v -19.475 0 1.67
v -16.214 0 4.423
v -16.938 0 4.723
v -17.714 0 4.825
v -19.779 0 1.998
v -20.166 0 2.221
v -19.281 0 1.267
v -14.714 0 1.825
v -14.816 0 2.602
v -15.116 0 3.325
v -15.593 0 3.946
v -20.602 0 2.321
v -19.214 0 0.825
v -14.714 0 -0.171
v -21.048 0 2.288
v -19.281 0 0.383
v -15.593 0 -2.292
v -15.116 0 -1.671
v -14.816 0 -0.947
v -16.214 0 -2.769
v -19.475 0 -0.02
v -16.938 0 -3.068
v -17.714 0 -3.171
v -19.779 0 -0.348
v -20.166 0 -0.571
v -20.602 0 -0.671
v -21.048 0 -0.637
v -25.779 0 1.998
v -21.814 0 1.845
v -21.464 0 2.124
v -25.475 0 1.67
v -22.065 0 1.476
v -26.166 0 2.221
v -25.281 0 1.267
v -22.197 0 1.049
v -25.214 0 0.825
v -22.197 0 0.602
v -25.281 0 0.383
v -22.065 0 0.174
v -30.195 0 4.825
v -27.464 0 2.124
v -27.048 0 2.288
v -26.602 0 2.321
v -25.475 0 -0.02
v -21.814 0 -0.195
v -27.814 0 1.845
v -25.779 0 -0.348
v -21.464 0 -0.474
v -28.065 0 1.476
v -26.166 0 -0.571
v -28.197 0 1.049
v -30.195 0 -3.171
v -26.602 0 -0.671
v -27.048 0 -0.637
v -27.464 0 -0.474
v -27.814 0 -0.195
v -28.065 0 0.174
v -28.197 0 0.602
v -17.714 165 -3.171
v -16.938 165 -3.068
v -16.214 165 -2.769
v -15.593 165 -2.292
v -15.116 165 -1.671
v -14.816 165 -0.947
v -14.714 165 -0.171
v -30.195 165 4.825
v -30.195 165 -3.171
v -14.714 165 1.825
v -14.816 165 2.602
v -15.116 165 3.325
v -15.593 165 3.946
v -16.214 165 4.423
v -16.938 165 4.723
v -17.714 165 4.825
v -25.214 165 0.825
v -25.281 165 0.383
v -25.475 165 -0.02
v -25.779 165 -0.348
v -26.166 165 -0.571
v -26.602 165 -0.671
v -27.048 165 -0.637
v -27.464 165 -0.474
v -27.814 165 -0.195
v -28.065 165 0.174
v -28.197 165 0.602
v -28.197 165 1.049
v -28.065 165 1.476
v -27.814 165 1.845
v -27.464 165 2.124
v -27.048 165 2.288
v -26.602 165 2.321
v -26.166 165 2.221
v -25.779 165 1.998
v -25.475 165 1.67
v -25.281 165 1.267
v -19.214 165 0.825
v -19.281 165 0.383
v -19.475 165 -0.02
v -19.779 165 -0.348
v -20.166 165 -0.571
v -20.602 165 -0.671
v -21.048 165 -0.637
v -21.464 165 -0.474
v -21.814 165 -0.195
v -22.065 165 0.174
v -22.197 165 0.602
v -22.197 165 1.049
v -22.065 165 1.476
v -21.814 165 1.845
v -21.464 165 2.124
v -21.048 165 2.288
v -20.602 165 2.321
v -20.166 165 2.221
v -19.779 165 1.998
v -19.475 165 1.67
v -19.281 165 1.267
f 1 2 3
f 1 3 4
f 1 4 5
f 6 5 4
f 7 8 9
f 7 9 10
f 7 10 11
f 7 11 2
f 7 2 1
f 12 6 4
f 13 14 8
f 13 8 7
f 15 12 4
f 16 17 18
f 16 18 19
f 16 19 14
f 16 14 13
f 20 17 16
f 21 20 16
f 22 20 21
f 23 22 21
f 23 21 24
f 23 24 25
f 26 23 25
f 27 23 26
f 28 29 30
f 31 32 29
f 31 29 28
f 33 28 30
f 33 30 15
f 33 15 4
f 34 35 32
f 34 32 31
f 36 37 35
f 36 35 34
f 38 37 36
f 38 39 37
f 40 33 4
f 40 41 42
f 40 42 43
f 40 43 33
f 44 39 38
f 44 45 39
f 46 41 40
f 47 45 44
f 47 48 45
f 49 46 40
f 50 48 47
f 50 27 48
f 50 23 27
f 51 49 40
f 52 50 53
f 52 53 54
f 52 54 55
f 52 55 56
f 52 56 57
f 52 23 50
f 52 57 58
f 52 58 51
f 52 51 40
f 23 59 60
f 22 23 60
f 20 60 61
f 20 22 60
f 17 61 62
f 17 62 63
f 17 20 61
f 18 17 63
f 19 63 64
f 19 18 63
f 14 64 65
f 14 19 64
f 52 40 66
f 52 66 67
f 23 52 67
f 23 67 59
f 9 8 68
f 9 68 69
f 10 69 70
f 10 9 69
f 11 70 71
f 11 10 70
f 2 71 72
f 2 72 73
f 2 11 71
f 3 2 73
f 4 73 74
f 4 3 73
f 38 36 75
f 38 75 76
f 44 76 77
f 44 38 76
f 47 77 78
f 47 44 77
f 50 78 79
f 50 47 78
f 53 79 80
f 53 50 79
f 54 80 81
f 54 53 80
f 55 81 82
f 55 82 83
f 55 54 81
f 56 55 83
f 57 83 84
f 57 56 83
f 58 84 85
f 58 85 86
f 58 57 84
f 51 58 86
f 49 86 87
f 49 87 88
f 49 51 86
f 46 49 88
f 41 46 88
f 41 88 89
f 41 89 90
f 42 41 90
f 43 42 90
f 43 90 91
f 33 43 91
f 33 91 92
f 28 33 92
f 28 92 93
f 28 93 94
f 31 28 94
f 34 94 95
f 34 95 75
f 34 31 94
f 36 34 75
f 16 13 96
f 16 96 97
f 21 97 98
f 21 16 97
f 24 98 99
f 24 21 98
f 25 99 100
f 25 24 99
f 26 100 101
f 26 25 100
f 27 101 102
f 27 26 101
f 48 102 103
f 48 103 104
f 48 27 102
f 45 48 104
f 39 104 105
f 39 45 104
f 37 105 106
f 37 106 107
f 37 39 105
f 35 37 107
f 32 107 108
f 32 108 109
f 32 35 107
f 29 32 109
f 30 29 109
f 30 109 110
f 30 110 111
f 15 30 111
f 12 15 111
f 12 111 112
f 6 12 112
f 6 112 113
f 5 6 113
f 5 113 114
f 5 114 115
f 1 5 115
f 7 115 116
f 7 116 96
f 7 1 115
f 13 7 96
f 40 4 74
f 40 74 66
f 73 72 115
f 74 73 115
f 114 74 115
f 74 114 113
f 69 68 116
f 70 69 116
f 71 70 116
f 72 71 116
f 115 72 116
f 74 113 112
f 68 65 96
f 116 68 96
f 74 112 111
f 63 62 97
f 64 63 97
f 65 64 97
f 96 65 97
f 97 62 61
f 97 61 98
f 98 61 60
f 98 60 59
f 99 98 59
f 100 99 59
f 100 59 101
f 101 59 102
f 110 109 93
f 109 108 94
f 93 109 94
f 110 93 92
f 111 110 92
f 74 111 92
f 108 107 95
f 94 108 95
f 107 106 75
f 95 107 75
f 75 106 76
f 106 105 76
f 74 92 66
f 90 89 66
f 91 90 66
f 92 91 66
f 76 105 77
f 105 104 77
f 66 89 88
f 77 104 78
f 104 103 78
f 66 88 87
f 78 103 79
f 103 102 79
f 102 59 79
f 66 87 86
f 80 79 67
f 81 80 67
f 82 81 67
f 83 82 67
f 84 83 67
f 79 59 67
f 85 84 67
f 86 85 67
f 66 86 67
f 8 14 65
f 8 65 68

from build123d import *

# Parameters (mm, degrees)
SKETCH1_R           = 1.5
BOSS_EXTRUDE1_DEPTH = 165


with BuildPart() as part:
    # Sketch1 → Boss-Extrude1 (new body)
    with BuildSketch(Plane(origin=(0, 0, 0), x_dir=(1, 0, 0), z_dir=(0, 1, 0))):
        with BuildLine():
            Line((-30.194572404, -4.825127674), (-30.194572404, 3.170664552))
            Line((-30.194572404, 3.170664552), (-19.637232632, 3.170664552))
            Line((-19.637232632, 3.170664552), (-17.713971419, 3.170664552))
            ThreePointArc((-17.713971419, 3.170664552), (-15.592651075, 2.291984895), (-14.713971419, 0.170664552))
            Line((-14.713971419, 0.170664552), (-14.713971419, -1.825127674))
            ThreePointArc((-14.713971419, -1.825127674), (-15.592651075, -3.946448018), (-17.713971419, -4.825127674))
            Line((-17.713971419, -4.825127674), (-30.194572404, -4.825127674))
        make_face()
        with Locations((-20.713971419, -0.825127674)):
            Circle(SKETCH1_R, mode=Mode.SUBTRACT)
        with Locations((-26.713971419, -0.825127674)):
            Circle(SKETCH1_R, mode=Mode.SUBTRACT)
    extrude(amount=BOSS_EXTRUDE1_DEPTH)


solid = part.part
